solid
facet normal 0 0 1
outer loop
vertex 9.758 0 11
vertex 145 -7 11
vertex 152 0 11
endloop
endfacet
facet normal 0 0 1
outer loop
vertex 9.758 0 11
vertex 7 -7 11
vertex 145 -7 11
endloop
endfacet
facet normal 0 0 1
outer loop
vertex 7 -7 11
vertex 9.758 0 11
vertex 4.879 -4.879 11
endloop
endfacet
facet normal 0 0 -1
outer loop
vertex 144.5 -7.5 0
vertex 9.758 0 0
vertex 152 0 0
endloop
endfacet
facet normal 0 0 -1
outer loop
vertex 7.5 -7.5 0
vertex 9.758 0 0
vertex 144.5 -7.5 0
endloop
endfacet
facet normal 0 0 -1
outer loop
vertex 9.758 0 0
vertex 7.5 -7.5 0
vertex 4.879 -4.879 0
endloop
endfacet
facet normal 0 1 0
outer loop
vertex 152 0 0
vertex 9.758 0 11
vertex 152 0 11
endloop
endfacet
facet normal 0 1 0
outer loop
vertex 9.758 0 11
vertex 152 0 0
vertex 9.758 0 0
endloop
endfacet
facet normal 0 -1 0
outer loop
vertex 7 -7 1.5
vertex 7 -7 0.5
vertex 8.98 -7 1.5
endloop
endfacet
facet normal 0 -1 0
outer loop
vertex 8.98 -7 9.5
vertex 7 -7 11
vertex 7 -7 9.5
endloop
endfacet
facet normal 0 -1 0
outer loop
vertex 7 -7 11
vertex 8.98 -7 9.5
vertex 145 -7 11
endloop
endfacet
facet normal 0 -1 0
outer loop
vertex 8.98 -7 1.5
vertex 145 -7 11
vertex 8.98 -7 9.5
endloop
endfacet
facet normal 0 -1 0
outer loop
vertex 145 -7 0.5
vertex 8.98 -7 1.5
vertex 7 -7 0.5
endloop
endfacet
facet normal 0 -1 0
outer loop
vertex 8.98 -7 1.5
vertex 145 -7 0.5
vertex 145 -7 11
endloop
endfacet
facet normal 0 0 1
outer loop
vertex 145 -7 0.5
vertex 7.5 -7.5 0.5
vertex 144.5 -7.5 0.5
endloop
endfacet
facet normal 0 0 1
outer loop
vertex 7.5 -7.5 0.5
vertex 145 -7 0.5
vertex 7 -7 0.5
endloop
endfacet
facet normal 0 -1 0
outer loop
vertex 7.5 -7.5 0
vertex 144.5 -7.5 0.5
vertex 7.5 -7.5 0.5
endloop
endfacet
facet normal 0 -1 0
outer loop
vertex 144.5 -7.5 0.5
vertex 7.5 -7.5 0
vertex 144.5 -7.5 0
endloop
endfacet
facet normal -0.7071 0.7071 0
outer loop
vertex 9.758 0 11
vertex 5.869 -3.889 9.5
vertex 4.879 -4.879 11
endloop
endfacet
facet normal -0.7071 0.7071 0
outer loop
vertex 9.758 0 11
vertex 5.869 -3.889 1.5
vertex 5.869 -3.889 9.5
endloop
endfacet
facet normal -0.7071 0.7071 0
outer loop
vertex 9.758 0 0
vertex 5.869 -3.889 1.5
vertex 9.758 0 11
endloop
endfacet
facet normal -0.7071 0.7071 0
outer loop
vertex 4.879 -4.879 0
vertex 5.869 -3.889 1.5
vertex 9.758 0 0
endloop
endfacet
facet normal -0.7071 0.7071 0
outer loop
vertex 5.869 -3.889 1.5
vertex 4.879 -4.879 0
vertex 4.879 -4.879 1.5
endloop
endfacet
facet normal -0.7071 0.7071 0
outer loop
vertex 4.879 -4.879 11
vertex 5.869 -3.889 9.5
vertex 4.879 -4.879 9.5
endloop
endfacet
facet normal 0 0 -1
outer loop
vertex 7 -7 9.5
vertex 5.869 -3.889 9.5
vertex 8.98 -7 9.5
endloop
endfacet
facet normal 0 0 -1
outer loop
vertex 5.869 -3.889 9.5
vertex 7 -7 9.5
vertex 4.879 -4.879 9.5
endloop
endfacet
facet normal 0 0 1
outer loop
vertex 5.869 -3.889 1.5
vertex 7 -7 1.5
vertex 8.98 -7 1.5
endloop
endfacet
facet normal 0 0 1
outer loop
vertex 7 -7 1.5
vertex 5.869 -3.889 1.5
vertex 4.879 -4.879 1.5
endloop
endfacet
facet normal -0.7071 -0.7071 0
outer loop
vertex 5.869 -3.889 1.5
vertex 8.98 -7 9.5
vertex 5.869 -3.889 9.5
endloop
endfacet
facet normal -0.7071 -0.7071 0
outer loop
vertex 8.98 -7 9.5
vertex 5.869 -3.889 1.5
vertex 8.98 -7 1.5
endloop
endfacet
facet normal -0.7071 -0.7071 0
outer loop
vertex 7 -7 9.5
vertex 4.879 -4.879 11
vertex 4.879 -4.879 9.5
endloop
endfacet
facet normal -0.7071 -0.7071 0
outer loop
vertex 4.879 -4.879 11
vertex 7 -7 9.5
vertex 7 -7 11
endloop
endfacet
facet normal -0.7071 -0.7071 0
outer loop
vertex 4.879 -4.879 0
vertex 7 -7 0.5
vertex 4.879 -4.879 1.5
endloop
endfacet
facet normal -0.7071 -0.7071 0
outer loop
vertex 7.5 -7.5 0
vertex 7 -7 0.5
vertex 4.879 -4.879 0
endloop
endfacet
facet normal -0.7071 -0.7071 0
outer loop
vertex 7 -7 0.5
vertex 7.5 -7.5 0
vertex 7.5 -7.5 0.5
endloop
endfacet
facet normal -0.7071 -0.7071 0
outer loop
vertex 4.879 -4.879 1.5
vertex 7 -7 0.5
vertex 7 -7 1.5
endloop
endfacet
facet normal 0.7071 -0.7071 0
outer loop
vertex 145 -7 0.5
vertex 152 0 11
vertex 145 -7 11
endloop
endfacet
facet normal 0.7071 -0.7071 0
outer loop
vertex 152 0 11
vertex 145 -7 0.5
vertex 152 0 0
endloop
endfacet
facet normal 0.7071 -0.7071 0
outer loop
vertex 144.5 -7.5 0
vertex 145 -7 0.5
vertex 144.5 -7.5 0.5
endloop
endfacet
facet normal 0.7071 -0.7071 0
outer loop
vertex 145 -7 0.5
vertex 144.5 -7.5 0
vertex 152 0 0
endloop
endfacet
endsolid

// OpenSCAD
//in mm
length = 152;

type = 3; //[0:straight only,1:corner left,2:corner right,3:corner left and right]

//Cable outlet on which side?
cable = -1; //[0:no,-1:left,1:right]

/*
	[Hidden]
*/
width = 7;
height = 11;

difference(){
	straight();
	if(type == 1 || type == 3)
		corner_left();
	if(type == 2 || type == 3)
		corner_right();
	if(cable == -1)
		cable_right();
	if(cable == 1)
		cable_left();
}

module straight(){
	translate([0,-width,0]){
	cube([length,width,height]);
	translate([0,-.5,0])
	cube([length,.5,.5]);
	}
}

module corner_left(){
	rotate([0,0,-135])
	translate([0,0,-.125])
	cube(16);
}

module corner_right(){
	translate([length,0,0])
	scale([-1,1,1])
	corner_left();
}

module cable_right(){
	rotate([0,0,-45])
	translate([-.1,-.1,-.1])
	cube([7,2*width,height+1]);
	
	rotate([0,0,-135])
	translate([.1,0,height/2-4])
	scale([-1,1,1])
	cube([1.5,width*3,8]);	
}



module cable_left(){
	translate([length,0,0])
	scale([-1,1,1])
	cable_right();
}
